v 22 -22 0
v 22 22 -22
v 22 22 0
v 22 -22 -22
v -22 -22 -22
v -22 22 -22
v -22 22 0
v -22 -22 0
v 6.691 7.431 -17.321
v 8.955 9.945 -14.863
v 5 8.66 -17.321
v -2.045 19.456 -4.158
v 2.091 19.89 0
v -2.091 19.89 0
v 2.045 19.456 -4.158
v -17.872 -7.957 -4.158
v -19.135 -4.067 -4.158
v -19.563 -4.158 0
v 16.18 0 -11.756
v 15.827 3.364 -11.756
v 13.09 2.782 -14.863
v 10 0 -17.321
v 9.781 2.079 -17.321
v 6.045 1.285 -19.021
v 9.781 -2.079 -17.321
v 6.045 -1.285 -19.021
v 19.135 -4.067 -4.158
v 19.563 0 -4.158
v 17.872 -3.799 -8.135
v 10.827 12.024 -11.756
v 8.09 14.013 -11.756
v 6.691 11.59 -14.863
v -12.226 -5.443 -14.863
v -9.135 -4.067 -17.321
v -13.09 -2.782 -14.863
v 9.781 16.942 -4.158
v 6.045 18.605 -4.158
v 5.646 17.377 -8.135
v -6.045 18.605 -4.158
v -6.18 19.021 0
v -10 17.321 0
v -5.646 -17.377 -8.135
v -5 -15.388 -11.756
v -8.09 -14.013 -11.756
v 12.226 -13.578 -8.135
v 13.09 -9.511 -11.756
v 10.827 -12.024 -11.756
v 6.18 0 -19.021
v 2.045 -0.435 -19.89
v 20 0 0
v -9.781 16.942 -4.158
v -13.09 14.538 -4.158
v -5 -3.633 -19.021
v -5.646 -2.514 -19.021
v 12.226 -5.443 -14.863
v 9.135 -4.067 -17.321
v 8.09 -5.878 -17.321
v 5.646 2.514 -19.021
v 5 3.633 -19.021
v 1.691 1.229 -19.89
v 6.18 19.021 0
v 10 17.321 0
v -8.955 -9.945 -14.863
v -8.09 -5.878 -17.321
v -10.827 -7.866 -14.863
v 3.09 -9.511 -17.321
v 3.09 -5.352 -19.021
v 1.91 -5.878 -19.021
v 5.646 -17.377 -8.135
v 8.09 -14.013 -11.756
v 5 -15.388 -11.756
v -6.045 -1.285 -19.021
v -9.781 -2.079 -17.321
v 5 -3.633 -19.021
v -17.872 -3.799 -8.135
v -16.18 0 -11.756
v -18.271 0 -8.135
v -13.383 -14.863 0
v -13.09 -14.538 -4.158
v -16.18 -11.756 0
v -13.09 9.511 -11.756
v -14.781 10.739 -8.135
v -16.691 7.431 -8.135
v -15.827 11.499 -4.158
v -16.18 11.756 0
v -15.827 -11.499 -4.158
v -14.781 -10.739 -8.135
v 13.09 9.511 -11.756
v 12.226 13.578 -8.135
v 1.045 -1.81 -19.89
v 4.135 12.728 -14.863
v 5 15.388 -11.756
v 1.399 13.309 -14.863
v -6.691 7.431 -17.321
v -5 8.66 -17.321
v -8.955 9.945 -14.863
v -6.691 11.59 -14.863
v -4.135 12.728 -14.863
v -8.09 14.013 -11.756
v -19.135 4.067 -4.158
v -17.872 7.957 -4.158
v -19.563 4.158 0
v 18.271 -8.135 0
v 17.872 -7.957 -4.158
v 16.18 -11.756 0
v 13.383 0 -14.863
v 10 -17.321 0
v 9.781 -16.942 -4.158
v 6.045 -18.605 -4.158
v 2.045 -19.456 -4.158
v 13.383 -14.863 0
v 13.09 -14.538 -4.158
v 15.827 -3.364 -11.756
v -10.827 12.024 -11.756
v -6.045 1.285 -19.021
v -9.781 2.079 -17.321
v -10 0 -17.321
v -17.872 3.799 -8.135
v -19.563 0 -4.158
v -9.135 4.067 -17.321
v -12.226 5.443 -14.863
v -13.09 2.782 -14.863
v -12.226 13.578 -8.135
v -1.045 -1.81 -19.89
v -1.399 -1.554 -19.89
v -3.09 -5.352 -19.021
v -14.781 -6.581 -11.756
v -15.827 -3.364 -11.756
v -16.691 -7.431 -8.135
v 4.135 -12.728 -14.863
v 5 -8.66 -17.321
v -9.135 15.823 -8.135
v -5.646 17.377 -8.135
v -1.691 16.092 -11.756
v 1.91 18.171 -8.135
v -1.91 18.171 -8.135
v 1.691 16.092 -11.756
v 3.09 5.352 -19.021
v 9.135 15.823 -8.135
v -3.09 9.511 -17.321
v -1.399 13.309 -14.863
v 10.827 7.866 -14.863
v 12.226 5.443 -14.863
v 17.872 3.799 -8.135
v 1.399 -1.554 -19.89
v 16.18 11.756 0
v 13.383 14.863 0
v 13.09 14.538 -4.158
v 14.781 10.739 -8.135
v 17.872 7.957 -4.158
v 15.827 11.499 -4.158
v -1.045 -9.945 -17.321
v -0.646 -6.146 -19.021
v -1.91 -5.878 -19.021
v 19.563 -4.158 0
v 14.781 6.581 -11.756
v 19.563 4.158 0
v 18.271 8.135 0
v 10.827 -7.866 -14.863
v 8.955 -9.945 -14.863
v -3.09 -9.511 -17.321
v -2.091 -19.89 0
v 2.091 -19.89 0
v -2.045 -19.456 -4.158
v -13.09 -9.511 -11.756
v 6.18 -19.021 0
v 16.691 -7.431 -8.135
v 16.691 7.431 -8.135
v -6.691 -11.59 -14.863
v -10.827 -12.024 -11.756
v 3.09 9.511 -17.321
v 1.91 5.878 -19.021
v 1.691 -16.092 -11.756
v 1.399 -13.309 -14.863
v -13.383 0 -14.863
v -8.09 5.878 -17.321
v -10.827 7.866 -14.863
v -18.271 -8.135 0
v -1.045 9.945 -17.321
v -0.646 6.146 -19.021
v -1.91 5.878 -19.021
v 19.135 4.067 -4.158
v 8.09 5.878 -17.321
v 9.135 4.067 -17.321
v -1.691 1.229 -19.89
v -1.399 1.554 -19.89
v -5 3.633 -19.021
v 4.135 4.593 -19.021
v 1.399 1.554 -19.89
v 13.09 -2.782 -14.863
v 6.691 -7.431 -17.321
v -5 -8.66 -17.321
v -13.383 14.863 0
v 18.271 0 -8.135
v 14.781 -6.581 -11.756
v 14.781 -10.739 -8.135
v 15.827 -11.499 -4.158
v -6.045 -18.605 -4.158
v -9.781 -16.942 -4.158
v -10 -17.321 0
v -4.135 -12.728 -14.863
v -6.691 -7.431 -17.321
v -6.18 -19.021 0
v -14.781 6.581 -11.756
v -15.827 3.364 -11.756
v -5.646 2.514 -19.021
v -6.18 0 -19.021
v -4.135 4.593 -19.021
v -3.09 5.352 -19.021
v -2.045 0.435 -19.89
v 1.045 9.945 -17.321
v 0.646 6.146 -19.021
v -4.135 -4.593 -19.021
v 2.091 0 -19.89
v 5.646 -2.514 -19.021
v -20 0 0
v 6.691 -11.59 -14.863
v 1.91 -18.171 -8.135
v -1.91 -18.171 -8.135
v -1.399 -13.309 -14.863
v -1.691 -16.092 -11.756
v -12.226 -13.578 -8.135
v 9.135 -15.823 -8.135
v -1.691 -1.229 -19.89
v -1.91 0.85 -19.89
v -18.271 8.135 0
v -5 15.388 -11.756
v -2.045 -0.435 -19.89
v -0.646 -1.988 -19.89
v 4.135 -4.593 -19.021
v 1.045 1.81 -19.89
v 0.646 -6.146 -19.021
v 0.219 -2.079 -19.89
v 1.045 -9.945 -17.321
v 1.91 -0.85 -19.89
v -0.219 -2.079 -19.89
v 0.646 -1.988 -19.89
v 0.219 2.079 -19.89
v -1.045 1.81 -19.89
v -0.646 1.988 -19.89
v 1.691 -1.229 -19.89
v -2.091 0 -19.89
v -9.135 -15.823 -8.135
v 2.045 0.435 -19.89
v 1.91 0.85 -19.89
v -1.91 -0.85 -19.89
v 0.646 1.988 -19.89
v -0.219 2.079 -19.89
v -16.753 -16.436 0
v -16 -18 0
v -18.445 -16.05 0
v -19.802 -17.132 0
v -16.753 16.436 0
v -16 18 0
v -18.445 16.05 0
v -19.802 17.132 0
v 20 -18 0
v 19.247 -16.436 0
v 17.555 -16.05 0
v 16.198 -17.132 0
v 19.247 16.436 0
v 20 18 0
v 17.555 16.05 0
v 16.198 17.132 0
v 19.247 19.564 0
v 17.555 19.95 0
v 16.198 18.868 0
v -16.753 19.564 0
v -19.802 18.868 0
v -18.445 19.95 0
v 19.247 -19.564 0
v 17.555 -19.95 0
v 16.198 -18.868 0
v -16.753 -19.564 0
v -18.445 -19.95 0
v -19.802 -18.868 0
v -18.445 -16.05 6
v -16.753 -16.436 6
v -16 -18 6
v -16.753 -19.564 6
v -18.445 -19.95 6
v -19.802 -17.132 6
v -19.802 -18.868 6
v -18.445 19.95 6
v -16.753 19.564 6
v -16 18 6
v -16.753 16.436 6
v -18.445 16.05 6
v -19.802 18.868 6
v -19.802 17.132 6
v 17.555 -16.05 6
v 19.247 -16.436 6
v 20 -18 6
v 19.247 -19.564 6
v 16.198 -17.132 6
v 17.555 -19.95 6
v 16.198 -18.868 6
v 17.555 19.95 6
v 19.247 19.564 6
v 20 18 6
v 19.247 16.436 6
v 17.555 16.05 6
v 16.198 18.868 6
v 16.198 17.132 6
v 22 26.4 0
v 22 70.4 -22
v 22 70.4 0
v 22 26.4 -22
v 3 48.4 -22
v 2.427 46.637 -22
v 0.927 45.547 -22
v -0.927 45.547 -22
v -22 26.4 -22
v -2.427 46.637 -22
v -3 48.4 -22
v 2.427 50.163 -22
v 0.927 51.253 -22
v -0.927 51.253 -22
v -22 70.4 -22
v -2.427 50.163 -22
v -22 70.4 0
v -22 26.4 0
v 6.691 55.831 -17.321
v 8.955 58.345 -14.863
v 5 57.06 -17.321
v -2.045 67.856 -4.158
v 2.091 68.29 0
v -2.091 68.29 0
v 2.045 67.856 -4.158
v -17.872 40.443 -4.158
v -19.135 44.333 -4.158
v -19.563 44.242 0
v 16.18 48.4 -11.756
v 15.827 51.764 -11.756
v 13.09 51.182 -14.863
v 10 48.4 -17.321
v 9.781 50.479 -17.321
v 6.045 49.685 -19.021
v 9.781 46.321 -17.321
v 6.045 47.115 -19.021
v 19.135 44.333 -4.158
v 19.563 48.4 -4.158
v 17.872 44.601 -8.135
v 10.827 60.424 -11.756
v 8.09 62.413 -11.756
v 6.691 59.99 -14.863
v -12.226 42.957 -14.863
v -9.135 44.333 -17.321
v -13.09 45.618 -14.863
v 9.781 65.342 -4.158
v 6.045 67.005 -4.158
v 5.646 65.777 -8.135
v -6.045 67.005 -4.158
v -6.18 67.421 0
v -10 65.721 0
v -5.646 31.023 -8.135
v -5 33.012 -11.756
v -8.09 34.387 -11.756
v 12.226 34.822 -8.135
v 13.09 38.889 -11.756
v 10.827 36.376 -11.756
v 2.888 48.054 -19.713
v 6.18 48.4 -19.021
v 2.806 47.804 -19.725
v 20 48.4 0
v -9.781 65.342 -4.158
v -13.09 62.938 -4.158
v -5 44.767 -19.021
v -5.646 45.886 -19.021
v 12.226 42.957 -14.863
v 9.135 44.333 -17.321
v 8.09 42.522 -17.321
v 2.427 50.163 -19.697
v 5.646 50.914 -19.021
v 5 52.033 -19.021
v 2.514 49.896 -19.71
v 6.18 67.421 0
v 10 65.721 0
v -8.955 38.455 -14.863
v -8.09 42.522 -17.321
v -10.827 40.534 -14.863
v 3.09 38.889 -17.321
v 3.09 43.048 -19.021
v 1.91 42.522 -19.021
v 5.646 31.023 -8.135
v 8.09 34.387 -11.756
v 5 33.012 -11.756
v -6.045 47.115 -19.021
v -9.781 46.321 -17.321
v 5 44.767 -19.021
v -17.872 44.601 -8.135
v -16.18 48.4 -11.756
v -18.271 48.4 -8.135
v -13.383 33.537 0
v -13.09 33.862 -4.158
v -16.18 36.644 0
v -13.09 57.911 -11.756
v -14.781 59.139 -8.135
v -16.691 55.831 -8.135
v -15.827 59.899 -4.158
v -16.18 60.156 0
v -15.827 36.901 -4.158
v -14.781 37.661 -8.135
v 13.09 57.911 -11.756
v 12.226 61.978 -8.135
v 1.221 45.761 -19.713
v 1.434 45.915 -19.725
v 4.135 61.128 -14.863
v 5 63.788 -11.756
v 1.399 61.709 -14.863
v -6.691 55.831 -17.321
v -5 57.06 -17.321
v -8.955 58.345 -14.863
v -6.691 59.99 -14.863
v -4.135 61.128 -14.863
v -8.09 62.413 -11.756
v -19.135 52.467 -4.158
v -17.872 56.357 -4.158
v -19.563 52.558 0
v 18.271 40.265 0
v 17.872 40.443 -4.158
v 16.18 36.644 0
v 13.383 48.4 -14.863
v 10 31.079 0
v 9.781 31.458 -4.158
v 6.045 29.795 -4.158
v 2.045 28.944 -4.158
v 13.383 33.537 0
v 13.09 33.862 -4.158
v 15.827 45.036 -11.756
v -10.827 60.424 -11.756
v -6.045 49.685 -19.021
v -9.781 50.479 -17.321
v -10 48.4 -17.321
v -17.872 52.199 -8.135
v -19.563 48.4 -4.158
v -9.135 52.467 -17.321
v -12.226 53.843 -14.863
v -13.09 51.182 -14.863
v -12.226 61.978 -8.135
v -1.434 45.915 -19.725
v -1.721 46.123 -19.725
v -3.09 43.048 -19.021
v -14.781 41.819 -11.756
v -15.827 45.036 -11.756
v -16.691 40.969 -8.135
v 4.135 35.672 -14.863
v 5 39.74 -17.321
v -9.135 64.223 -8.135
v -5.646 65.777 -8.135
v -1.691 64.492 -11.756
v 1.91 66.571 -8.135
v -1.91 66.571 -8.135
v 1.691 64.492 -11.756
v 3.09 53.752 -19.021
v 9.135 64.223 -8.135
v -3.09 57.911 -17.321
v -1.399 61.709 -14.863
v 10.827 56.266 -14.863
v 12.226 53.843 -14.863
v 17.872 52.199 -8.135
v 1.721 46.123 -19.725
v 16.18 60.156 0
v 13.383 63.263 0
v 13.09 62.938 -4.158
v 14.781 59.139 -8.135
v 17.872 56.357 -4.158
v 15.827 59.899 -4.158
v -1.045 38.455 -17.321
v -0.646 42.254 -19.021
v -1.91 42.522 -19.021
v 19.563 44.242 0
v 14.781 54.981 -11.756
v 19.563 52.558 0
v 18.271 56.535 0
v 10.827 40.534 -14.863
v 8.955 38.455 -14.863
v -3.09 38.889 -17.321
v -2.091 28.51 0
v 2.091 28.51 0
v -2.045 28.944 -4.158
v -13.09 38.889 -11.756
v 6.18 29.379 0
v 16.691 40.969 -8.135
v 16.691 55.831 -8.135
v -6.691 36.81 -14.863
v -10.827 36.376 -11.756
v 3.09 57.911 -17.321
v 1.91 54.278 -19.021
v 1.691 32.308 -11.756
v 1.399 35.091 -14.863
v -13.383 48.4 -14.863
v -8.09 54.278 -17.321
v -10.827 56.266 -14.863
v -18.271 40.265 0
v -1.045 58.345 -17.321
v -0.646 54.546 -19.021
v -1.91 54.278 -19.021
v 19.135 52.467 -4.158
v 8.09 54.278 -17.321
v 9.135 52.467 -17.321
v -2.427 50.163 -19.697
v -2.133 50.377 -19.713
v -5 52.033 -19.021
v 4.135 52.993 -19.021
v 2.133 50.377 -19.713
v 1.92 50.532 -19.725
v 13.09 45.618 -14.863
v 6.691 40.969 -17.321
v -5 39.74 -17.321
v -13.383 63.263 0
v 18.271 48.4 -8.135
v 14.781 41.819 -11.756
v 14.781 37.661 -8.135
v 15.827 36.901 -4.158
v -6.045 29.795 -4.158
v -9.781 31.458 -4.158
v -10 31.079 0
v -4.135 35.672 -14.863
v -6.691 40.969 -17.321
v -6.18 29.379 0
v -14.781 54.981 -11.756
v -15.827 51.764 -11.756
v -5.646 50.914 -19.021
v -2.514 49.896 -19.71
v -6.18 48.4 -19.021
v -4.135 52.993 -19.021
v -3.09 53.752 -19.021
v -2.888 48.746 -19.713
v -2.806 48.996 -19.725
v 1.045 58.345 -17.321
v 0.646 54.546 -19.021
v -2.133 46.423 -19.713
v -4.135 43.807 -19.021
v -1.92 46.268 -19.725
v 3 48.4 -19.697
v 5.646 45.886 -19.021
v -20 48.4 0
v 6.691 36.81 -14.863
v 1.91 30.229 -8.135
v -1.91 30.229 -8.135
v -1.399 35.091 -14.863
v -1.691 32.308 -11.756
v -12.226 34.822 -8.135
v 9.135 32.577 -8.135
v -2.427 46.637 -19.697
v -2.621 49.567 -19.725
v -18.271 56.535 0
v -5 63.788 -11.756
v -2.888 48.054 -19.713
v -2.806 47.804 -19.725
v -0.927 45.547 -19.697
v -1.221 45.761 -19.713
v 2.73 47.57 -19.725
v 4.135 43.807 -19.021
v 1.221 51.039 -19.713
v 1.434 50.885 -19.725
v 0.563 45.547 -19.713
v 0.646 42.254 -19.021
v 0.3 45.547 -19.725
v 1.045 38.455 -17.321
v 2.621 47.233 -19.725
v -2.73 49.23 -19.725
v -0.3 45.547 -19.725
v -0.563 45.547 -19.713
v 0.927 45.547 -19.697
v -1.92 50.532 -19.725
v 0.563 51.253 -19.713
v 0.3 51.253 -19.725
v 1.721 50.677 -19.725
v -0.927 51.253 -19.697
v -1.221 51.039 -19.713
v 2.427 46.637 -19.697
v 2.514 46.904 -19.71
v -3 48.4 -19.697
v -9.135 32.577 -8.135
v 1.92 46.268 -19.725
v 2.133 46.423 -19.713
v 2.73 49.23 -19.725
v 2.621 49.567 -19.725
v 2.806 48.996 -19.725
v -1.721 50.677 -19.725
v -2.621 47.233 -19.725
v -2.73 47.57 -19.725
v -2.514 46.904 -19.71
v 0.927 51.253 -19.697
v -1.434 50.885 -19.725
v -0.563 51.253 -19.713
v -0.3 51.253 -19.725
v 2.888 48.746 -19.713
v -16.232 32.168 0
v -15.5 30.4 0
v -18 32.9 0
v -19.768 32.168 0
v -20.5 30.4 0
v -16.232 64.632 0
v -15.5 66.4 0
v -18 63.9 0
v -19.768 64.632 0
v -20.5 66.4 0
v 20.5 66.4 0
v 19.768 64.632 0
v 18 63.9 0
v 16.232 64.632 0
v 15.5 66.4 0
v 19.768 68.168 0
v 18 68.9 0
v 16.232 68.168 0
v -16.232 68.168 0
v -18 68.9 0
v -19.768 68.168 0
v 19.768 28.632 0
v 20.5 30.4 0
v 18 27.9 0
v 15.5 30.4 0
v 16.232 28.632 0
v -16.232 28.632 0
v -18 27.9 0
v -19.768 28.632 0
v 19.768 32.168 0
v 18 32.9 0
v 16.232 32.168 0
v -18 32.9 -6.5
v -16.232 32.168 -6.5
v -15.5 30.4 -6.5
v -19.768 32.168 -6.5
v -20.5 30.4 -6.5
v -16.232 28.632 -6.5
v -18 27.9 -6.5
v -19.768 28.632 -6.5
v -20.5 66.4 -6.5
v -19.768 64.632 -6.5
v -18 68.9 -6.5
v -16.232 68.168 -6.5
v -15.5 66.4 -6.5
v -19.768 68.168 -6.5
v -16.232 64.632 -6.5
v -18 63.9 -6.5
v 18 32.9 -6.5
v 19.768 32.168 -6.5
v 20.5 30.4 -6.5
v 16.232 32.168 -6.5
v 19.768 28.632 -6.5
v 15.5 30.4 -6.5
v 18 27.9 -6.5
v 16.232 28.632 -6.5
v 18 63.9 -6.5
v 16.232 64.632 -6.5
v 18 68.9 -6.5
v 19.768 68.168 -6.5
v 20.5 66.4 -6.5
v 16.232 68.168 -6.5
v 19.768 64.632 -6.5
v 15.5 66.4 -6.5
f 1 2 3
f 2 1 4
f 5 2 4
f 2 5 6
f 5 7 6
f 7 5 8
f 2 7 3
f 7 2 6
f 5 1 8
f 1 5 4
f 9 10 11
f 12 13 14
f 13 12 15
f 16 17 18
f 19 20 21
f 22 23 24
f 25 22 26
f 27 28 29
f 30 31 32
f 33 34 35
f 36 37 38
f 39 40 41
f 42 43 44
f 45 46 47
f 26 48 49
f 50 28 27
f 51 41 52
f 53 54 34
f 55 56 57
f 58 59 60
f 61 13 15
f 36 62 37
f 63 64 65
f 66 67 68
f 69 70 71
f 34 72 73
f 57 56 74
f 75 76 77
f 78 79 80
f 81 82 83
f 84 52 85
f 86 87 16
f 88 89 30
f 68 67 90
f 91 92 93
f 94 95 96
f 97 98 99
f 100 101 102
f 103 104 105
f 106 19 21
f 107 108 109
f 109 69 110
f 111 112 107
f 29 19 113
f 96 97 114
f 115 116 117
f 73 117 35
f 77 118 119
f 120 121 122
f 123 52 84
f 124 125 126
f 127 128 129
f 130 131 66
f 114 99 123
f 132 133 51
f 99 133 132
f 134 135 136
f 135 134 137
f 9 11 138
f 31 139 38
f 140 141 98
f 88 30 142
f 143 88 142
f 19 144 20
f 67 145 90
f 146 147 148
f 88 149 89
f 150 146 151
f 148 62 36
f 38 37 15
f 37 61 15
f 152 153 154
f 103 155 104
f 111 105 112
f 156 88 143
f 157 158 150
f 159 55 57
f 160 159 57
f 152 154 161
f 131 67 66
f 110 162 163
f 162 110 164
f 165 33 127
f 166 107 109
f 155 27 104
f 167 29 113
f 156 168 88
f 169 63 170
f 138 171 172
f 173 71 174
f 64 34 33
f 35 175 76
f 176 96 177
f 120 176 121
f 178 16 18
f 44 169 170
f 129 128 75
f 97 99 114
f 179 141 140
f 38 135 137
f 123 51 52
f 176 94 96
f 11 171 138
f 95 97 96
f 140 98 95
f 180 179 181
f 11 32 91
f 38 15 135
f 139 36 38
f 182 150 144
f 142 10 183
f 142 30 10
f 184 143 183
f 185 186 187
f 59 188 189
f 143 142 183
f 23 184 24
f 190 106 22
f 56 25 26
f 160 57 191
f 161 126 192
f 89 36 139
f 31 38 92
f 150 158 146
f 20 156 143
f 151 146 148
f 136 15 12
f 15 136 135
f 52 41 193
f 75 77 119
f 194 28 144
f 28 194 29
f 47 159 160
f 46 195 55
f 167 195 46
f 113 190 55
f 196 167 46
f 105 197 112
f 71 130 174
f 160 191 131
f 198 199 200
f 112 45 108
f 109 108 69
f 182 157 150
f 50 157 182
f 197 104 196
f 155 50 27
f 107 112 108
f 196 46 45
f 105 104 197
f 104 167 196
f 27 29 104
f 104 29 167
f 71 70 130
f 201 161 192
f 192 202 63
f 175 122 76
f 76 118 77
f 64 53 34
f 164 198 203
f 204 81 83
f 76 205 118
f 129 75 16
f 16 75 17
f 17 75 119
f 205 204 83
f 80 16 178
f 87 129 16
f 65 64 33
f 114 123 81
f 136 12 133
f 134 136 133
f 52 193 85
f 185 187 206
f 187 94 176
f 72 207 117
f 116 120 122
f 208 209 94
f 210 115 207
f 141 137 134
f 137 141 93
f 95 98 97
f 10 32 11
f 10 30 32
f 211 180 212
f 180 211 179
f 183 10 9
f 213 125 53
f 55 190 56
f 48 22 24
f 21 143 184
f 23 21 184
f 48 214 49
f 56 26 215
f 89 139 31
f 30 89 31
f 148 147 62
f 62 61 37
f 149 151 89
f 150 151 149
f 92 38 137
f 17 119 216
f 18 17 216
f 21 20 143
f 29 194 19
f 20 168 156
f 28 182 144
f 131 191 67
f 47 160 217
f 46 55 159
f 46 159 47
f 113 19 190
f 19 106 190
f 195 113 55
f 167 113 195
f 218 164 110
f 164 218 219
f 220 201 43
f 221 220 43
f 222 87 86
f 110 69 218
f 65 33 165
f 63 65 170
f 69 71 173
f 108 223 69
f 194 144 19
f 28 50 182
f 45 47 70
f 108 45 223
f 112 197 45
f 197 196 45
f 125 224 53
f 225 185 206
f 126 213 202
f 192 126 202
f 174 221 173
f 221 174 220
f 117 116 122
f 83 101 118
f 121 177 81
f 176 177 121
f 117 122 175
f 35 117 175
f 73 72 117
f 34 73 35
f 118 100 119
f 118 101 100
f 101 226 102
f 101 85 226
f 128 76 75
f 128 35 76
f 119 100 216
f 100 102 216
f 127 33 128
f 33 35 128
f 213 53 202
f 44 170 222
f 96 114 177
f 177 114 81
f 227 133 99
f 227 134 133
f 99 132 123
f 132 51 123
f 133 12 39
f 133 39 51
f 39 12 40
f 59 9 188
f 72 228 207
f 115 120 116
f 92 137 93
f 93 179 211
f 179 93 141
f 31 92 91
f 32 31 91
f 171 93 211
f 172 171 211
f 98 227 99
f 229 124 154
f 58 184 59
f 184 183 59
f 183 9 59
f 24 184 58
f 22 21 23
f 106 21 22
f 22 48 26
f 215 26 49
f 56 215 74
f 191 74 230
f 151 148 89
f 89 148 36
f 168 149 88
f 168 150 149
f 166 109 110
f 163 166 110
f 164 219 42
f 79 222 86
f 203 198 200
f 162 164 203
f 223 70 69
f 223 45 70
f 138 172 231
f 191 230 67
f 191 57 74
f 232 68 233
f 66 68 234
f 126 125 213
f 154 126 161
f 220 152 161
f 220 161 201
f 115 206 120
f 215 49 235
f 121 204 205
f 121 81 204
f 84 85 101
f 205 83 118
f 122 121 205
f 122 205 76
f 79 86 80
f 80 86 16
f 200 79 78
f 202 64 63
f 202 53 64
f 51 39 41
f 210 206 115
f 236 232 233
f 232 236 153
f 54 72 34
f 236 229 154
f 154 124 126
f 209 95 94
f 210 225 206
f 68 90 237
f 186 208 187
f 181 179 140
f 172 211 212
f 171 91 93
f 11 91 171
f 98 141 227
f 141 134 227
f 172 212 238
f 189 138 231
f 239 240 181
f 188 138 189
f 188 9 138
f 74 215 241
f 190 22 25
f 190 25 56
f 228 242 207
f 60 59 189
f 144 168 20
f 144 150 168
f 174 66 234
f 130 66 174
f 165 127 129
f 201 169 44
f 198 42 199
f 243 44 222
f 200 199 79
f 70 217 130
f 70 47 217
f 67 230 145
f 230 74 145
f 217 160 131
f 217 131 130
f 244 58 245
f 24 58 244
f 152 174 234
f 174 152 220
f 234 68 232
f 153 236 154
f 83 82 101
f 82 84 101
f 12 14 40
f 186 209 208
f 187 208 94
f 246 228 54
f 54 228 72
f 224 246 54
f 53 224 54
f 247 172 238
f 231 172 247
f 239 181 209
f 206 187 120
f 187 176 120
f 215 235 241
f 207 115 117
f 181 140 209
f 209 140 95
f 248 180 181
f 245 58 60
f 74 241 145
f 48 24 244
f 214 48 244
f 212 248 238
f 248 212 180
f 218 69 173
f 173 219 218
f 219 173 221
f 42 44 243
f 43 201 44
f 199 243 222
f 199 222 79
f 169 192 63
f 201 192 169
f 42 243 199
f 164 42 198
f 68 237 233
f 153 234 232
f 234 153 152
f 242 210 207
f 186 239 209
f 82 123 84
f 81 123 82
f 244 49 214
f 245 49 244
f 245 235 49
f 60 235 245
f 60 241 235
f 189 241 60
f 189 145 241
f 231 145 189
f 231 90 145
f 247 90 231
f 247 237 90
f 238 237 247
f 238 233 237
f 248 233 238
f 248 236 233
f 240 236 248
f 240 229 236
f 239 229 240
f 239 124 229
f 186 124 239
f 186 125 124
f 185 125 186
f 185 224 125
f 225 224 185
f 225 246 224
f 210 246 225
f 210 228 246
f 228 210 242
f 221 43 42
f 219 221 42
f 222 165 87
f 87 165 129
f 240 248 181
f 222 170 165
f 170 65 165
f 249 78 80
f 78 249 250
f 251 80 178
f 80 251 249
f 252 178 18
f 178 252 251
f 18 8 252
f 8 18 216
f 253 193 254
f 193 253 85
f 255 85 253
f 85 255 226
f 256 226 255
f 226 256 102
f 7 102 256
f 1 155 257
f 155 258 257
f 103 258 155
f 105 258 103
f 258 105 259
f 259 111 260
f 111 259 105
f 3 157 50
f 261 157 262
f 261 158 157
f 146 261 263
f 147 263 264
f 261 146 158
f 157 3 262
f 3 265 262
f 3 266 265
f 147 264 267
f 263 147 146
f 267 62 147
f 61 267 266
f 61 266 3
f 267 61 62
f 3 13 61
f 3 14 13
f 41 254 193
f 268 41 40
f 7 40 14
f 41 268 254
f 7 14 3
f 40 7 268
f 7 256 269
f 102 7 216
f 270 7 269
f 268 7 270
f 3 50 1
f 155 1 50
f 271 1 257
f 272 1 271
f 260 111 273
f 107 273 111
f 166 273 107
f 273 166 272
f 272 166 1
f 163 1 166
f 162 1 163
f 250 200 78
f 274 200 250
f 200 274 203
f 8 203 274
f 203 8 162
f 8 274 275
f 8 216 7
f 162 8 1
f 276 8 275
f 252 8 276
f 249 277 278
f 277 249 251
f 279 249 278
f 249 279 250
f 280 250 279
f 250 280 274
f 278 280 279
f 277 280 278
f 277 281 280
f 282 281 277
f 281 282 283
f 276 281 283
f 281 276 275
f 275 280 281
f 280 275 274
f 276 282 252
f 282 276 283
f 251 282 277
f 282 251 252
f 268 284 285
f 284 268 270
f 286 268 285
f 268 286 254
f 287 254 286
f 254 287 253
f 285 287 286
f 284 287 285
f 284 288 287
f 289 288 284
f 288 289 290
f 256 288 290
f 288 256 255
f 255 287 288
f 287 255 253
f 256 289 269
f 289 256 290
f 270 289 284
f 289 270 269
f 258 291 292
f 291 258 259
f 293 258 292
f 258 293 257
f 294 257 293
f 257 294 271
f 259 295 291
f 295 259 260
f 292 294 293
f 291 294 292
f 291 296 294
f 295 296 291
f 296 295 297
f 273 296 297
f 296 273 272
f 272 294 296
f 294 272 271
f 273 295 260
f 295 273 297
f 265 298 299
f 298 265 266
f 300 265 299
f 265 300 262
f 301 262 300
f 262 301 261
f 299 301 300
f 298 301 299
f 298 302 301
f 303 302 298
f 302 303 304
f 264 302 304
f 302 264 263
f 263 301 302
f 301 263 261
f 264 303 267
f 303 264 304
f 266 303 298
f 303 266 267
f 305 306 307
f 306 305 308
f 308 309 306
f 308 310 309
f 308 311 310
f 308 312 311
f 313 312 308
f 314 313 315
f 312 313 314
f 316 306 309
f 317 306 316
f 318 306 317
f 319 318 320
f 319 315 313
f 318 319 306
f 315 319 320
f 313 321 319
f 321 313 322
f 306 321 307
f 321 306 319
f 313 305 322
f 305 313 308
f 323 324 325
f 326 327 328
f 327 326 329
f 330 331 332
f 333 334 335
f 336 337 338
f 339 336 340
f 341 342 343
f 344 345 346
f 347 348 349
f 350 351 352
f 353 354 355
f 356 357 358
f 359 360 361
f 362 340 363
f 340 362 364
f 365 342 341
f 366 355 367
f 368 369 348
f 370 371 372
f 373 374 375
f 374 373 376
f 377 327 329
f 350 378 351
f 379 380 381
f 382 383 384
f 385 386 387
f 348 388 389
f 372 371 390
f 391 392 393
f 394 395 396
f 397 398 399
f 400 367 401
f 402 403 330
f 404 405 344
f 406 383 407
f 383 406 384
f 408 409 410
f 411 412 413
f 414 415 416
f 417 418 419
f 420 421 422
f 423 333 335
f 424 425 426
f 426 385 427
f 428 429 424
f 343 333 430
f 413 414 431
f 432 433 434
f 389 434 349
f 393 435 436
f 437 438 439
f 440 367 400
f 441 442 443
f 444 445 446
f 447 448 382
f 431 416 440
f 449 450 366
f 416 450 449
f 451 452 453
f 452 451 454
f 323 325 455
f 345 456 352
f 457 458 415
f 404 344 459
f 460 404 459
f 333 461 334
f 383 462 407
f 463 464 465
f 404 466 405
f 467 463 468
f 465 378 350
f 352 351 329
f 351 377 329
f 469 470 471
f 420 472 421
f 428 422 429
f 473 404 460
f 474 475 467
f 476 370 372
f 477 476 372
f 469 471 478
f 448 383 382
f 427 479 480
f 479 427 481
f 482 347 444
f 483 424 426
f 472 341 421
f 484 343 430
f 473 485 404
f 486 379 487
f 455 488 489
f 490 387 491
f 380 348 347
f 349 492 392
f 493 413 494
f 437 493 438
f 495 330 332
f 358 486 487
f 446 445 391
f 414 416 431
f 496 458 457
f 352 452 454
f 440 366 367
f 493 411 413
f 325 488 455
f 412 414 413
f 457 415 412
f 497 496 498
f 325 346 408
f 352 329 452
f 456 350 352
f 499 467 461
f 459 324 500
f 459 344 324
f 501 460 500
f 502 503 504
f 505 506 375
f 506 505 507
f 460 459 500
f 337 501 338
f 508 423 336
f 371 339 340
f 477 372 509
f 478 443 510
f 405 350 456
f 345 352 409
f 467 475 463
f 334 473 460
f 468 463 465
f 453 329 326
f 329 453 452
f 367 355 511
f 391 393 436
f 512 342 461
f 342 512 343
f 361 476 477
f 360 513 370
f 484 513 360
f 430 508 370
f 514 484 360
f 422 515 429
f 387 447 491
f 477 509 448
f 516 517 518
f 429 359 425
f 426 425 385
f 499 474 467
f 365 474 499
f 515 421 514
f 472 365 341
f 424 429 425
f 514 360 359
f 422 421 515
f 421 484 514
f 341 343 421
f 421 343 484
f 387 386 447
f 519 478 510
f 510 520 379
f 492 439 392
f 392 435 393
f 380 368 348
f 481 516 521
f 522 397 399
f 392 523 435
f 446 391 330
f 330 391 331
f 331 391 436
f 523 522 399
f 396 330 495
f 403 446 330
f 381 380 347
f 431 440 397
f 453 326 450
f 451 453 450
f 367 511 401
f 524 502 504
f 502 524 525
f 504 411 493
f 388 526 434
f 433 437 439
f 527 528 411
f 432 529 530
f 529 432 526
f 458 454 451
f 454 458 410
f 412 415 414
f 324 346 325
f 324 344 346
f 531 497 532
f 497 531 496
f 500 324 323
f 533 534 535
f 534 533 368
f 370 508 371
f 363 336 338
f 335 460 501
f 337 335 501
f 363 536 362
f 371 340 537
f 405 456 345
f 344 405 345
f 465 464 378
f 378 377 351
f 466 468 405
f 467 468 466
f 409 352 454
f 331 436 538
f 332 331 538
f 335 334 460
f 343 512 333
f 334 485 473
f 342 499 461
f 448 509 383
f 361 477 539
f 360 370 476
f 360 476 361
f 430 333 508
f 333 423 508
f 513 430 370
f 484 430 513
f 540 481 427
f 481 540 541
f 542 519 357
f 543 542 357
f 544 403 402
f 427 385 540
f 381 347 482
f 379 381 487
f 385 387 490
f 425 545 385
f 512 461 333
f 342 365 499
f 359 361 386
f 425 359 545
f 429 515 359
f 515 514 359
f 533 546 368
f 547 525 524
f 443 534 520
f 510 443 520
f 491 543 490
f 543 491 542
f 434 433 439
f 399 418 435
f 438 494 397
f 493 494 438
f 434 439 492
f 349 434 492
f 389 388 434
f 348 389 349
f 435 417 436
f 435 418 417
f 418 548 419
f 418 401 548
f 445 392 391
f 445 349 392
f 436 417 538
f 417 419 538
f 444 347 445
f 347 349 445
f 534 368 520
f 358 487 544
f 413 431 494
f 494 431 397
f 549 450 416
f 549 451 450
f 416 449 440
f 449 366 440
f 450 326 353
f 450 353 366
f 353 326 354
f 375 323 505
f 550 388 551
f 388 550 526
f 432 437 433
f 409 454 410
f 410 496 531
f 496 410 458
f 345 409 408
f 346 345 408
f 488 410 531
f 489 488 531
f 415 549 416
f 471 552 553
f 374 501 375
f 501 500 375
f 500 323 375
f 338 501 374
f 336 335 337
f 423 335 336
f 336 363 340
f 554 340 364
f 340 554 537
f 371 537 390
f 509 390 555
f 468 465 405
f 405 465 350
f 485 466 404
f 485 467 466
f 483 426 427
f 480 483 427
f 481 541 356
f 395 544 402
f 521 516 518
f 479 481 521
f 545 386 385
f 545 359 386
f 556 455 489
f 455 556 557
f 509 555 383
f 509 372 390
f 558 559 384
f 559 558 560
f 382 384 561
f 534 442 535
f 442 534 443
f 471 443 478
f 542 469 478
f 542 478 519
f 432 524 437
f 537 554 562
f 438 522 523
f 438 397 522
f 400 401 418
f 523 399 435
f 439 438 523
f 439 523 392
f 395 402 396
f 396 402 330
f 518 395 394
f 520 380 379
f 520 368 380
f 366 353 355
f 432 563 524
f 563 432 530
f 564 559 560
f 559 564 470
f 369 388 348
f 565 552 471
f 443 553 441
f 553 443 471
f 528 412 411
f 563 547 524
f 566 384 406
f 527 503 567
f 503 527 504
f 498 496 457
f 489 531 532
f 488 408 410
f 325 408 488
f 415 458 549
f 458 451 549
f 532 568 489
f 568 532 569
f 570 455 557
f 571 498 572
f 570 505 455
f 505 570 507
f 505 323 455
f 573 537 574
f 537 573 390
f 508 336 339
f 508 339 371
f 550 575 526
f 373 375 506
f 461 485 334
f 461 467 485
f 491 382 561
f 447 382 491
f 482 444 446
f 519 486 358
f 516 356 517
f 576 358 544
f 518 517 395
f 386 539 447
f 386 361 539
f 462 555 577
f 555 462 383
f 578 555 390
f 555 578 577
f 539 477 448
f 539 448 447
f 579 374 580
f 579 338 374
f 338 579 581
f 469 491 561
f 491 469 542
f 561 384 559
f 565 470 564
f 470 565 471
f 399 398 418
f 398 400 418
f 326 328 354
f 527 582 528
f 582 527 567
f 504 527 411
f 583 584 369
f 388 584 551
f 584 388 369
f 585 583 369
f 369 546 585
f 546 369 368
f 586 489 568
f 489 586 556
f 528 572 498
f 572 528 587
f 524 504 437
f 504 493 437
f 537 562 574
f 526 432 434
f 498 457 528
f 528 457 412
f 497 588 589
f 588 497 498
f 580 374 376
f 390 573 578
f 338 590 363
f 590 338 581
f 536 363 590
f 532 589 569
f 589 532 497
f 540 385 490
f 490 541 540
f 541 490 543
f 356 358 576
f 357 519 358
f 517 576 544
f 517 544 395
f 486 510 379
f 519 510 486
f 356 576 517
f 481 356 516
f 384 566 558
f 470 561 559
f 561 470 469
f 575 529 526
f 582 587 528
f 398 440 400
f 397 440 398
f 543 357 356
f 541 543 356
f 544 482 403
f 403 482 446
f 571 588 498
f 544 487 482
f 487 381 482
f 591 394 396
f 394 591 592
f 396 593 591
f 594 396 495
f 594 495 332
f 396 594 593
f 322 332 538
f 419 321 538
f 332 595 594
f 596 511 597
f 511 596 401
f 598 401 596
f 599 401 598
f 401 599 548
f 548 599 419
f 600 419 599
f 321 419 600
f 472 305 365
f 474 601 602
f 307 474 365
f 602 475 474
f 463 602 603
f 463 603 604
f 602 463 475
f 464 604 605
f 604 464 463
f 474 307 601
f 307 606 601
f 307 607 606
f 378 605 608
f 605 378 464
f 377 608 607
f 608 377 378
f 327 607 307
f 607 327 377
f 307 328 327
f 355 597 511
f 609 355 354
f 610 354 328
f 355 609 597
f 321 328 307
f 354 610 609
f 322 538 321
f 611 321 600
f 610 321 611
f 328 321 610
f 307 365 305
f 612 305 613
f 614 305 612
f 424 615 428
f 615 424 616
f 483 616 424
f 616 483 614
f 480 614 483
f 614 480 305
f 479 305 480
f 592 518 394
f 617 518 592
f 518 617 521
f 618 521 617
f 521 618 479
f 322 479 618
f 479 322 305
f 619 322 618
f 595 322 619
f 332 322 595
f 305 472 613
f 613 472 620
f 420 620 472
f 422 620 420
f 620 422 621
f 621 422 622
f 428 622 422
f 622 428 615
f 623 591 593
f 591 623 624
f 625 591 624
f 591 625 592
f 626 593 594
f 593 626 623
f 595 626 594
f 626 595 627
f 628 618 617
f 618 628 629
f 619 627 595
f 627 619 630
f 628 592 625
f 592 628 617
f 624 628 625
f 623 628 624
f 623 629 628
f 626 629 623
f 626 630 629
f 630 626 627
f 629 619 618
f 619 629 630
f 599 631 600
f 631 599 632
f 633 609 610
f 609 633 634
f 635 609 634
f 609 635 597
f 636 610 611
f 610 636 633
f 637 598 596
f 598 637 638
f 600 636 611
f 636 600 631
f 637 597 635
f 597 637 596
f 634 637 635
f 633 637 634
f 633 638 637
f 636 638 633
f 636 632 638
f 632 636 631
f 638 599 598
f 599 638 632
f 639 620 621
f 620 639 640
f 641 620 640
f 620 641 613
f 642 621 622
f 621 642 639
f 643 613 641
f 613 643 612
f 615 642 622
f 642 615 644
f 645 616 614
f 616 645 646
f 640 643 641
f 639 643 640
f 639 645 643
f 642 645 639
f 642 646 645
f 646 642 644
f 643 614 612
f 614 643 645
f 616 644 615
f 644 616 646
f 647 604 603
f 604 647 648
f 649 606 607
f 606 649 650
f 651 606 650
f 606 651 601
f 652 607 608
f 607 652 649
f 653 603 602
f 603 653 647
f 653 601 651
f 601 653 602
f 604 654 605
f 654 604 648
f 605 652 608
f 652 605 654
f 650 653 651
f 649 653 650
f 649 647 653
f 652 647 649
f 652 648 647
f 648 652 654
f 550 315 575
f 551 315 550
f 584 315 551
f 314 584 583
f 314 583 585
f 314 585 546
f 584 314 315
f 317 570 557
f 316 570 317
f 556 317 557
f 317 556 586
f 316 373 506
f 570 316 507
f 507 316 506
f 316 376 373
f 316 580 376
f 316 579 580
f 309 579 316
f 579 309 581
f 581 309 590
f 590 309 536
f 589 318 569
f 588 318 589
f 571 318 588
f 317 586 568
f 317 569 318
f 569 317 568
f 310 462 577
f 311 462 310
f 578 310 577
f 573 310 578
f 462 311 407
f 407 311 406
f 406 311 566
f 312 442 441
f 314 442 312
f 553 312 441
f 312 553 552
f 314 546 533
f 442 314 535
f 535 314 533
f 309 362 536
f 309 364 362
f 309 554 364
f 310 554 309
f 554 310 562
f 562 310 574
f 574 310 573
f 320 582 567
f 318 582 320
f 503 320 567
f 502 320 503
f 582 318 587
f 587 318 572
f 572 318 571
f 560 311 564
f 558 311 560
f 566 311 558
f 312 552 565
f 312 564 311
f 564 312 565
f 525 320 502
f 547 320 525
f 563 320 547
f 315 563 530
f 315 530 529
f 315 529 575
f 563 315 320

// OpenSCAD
r = 20;
t = 2;

w = 2*(r + t);
gap = 0.5;
l = 3*t;

hole = 3;

module ideal_mould(){
    difference(){
        cube([w, w, w], center=true);
        sphere(r);
    }
}

module base(){
    intersection(){
        ideal_mould();
        translate([0, 0, -w/4])
        cube([w, w, w/2], center=true);
    }
    for (i = [-1, 1])
        for (j = [-1, 1])
            translate([i*(w/2-2*t), j*(w/2-2*t), 0])
            cylinder(3*t, t, t);
}

module top(){
    difference(){
        intersection(){
            ideal_mould();
            translate([0, 0, -w/4])
            cube([w, w, w/2], center=true);
        }
        for (i = [-1, 1])
            for (j = [-1, 1])
                translate([i*(w/2-2*t), j*(w/2-2*t), -l-gap])
                cylinder(l + gap, t+gap, t+gap);
        cylinder(1000, hole, hole, center=true);
    }
}

base();
translate([0, w*1.1, 0])
top();
